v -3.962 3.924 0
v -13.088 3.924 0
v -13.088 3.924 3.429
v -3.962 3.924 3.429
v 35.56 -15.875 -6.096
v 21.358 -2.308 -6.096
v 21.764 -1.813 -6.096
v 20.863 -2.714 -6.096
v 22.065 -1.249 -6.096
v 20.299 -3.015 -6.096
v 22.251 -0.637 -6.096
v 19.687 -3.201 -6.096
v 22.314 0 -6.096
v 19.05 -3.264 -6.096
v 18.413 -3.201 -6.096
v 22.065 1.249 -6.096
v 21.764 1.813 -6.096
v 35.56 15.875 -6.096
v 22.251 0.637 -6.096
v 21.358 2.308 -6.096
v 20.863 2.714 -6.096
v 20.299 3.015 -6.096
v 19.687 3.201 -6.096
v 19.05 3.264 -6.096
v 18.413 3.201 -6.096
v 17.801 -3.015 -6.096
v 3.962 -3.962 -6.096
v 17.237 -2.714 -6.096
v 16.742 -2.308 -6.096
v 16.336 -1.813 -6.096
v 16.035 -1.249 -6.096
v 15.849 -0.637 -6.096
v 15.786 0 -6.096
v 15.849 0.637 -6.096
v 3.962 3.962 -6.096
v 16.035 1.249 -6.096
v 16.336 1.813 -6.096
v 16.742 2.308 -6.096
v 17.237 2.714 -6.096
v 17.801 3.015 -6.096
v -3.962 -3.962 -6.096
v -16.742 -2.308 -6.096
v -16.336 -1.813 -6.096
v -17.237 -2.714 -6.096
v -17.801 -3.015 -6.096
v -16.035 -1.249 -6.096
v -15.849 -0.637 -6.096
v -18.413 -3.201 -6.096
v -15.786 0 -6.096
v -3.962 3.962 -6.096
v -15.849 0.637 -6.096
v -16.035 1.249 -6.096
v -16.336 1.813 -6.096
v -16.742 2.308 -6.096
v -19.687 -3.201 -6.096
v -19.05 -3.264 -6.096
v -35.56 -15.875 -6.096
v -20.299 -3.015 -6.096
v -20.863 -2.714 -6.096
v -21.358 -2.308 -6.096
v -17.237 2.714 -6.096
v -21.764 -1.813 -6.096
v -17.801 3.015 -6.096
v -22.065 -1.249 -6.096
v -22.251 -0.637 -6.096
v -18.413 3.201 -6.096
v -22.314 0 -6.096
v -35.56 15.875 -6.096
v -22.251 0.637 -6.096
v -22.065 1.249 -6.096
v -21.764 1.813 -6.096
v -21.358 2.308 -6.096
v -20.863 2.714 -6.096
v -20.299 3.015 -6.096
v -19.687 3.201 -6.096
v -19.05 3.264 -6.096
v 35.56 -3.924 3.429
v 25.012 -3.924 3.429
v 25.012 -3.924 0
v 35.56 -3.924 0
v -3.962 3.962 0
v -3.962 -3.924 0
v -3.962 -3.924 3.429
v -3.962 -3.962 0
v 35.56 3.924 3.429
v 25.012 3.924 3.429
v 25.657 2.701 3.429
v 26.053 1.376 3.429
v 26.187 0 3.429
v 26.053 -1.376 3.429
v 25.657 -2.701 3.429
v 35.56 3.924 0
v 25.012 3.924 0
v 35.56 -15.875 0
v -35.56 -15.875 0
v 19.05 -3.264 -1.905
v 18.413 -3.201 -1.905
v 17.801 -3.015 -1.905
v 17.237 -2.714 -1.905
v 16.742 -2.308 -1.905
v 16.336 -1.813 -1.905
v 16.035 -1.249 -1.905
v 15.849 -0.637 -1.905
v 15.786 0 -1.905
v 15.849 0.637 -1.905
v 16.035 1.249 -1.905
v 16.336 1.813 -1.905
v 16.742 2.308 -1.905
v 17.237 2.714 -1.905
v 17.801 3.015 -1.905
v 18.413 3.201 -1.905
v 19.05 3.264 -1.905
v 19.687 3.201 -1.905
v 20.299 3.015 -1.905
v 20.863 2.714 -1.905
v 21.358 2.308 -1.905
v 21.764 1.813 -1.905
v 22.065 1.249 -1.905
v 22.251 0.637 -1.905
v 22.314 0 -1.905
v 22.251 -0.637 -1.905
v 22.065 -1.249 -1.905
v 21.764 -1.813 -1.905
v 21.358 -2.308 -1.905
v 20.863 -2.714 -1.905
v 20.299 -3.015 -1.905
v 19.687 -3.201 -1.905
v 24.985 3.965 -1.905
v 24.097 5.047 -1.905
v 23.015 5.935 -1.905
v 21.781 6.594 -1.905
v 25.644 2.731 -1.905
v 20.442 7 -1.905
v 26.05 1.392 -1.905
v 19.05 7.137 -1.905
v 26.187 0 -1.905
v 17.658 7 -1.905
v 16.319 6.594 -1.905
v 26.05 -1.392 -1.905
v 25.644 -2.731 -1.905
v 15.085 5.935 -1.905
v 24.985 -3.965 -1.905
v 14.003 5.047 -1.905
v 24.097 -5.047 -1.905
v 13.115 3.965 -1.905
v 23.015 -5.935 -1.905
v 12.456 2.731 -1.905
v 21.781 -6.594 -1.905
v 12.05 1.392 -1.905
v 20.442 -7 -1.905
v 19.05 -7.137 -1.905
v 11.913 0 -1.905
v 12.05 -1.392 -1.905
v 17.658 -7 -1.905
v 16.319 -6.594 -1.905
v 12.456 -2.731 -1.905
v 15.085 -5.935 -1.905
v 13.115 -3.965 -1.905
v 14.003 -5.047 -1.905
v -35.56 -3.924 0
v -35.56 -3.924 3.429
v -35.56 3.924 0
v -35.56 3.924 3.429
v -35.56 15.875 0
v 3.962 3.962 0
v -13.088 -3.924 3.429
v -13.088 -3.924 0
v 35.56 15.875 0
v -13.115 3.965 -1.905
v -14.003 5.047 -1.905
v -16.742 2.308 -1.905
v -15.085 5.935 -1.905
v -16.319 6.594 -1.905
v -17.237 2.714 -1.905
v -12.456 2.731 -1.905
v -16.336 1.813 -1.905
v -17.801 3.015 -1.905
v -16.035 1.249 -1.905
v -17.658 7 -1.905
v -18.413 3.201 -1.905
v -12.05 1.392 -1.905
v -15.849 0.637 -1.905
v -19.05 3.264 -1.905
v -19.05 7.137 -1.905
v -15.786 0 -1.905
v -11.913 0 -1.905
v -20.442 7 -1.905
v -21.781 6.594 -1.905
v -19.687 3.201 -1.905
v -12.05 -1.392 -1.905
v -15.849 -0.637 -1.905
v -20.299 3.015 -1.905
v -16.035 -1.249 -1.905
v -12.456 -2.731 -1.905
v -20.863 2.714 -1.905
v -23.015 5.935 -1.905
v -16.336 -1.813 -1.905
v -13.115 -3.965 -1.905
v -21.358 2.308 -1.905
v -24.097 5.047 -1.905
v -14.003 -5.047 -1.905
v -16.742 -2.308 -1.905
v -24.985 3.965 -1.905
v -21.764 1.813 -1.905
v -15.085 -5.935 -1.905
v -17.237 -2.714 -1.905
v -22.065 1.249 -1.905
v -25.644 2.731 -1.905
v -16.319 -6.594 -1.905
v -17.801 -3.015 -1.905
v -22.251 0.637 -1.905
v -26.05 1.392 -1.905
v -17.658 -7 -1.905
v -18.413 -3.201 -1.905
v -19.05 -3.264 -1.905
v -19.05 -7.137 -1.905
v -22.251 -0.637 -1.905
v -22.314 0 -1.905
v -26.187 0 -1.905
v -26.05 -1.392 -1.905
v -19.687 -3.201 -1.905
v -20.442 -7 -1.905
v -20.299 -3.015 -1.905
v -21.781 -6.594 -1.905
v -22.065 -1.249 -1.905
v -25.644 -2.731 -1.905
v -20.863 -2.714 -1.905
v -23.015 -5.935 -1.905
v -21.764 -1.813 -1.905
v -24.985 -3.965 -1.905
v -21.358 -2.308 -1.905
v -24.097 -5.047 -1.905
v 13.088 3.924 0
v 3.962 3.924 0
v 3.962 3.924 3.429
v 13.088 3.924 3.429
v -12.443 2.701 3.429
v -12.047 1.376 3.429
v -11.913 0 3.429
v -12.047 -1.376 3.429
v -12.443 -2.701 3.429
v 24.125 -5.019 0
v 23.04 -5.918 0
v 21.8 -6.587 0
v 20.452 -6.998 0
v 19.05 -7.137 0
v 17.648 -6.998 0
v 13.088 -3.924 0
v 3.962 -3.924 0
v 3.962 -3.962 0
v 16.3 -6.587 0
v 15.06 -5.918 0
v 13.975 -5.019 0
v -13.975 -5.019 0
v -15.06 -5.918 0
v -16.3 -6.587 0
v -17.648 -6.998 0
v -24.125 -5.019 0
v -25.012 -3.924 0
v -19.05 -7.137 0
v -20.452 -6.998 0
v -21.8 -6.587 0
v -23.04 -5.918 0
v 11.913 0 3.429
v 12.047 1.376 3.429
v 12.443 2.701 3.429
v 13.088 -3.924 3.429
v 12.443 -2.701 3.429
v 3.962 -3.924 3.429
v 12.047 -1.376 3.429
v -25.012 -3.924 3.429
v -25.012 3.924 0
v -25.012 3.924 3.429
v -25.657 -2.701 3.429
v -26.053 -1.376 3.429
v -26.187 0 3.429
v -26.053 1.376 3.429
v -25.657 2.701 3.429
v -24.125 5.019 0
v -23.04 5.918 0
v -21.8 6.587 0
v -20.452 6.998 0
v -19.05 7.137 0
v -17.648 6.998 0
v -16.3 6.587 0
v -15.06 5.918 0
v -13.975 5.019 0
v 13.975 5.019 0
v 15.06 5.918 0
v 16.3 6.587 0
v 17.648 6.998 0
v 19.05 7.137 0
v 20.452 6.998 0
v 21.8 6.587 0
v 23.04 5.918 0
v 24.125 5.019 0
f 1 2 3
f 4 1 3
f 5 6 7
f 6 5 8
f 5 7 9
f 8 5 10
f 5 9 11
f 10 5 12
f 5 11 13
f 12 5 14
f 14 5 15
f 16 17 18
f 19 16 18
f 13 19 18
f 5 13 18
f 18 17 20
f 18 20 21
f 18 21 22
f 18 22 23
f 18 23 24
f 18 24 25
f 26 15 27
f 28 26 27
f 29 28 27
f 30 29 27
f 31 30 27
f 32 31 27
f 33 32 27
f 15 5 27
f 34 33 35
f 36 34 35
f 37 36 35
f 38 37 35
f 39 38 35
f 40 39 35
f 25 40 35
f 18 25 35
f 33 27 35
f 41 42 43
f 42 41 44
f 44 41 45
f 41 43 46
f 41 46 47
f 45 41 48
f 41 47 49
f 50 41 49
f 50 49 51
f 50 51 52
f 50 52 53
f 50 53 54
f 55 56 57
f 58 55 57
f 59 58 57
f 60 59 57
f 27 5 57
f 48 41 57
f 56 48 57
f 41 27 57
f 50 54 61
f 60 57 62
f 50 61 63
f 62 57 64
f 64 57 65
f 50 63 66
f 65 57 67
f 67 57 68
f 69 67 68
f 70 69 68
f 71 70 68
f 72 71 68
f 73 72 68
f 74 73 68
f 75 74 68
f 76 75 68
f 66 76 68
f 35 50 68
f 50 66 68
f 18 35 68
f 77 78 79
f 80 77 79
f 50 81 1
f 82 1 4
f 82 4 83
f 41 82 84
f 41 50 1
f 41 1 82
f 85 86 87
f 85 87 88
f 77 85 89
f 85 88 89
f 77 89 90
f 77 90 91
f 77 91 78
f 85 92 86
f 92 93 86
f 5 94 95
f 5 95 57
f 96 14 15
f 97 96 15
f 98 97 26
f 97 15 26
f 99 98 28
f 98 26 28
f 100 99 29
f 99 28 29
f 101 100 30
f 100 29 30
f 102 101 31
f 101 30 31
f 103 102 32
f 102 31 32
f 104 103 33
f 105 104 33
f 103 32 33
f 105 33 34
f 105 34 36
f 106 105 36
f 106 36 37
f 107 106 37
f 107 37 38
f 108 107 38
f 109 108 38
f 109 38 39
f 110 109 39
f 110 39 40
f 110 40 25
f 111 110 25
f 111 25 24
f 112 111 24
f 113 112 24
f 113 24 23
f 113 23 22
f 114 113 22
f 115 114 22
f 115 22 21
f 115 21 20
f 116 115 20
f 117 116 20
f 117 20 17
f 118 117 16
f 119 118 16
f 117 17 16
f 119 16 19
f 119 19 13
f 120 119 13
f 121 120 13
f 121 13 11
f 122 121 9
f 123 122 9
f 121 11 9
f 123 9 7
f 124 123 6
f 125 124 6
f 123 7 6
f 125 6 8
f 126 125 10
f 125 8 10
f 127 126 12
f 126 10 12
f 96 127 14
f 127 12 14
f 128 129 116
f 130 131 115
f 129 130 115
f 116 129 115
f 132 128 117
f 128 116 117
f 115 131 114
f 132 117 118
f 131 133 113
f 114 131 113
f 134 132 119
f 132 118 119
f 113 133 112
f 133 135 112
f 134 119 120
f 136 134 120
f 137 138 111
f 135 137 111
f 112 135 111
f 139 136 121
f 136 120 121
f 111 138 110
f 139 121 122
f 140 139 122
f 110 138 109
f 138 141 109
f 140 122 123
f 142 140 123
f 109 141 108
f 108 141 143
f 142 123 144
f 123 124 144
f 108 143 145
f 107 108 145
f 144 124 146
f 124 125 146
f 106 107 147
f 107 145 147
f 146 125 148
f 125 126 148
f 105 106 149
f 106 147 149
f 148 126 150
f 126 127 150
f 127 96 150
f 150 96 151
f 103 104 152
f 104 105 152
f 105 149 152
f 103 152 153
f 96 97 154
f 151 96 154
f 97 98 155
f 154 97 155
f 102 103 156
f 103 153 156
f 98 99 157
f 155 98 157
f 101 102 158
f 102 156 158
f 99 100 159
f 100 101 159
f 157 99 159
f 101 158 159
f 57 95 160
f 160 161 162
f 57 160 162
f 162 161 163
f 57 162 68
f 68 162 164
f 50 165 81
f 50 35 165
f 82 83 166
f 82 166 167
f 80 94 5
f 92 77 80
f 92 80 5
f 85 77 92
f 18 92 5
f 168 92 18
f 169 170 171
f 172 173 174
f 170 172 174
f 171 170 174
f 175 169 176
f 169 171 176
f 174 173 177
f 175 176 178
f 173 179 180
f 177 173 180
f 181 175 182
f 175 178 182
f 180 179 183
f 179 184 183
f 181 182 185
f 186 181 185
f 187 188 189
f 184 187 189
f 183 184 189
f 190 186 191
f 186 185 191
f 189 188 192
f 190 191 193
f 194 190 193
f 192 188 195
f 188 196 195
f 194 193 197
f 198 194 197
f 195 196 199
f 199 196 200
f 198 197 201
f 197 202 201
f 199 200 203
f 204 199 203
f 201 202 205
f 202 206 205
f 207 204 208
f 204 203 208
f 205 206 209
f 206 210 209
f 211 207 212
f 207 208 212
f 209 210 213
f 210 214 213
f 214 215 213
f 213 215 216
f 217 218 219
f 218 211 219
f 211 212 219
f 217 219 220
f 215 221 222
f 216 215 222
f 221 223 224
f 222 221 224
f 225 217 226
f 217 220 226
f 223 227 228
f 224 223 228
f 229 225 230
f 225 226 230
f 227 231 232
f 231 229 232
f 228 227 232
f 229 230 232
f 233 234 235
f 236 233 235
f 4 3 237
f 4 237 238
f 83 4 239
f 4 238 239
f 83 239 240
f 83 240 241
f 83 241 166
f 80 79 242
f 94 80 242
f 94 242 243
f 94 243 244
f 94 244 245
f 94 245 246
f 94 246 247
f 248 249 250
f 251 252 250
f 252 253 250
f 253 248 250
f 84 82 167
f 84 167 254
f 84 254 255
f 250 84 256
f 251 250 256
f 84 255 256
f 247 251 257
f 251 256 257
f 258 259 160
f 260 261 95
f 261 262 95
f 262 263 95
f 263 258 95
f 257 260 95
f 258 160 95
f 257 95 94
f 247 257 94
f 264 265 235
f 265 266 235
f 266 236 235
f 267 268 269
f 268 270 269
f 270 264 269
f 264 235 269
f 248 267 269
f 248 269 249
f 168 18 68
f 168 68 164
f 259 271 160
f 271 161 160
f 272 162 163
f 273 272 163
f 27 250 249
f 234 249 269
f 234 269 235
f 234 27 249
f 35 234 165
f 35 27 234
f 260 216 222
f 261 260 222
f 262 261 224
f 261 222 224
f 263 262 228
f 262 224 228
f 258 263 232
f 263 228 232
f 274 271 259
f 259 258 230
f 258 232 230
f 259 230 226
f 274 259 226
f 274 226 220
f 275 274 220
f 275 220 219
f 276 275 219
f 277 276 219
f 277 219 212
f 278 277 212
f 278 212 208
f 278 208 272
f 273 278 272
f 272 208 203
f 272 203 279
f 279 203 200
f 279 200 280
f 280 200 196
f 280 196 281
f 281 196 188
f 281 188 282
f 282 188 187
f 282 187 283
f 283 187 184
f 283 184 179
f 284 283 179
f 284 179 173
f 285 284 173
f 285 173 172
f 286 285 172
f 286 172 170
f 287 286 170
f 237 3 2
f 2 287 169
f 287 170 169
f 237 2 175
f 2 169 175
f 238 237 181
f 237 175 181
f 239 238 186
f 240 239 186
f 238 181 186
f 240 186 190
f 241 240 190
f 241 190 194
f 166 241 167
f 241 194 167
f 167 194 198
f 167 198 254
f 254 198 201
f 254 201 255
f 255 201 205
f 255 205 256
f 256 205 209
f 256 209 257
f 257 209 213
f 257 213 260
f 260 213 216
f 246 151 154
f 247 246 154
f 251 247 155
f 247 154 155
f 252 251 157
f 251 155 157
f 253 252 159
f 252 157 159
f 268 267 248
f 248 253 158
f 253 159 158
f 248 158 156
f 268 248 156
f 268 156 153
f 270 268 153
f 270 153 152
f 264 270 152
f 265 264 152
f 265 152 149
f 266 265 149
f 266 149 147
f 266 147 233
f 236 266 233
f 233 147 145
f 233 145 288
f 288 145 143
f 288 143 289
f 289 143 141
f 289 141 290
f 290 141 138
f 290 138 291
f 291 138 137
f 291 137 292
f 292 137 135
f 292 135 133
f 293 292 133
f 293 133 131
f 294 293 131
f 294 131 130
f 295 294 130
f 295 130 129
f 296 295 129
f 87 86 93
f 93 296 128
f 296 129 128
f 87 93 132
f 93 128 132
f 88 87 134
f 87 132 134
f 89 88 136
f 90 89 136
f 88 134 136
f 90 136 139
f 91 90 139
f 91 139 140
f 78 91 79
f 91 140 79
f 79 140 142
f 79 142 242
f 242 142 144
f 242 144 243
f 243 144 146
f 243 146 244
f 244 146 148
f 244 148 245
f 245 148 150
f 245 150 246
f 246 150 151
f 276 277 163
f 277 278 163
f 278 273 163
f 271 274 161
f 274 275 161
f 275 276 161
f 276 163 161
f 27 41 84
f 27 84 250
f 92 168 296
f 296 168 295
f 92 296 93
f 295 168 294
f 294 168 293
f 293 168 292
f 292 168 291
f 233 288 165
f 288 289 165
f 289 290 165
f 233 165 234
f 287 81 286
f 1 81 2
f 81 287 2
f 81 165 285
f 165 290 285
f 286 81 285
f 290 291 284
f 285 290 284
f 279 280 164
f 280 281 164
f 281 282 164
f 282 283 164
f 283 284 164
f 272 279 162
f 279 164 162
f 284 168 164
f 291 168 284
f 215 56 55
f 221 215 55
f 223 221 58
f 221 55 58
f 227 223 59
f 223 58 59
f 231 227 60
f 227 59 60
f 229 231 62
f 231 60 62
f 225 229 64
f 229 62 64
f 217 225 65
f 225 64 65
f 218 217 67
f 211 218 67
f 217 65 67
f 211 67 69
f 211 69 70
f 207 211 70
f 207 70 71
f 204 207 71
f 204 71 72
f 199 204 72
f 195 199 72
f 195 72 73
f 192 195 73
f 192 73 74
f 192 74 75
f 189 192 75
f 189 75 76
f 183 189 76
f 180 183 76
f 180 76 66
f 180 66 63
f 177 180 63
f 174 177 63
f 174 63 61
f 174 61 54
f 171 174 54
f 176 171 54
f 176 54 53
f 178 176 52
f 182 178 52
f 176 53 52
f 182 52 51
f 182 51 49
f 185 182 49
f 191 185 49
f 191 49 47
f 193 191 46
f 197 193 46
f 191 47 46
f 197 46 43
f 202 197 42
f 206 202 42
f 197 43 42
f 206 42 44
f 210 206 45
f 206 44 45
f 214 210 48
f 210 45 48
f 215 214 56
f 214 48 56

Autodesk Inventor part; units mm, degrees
sketch "Sketch_1" plane through (0, 0, 0) normal (1, 0, 0) x (0, 1, 0)
  line L0 (3.9243, 3.429) -> (-3.9243, 3.429)
  line L1 (-3.9243, 3.429) -> (-3.9243, 0)
  line L2 (-3.9243, 0) -> (-15.875, 0)
  line L3 (-15.875, 0) -> (-15.875, -6.096)
  line L4 (-15.875, -6.096) -> (15.875, -6.096)
  line L5 (15.875, -6.096) -> (15.875, 0)
  line L6 (15.875, 0) -> (3.9243, 0)
  line L7 (3.9243, 0) -> (3.9243, 3.429)
extrude "Extrusion1" add sketch "Sketch_1" along normal mid plane 71.12
sketch "Sketch2" plane through (-35.56, 3.9243, 3.429) normal (0, 0, 1) x (1, 0, 0)
  point P0 (16.51, -3.9243)
hole "Drilling 1" at (-19.05, 0, 3.429) direction (0, 0, -1) diameter 6.5278 depth 9.525 counterbore diameter 14.2748 counterbore depth 5.334
sketch "Sketch3" plane through (35.56, -3.9243, 3.429) normal (0, 0, 1) x (1, 0, 0)
  point P0 (-16.51, 3.9243)
hole "Drilling 2" at (19.05, 0, 3.429) direction (0, 0, -1) diameter 6.5278 depth 9.525 counterbore diameter 14.2748 counterbore depth 5.334
sketch "Sketch_4" plane through (0, 0, 0) normal (0, 0, 1) x (1, 0, 0)
  line L0 (-3.9624, -3.9624) -> (3.9624, -3.9624)
  line L1 (3.9624, -3.9624) -> (3.9624, 3.9624)
  line L2 (3.9624, 3.9624) -> (-3.9624, 3.9624)
  line L3 (-3.9624, 3.9624) -> (-3.9624, -3.9624)
extrude "Extrusion2" cut sketch "Sketch_4" along normal mid plane 15.24
ref_plane "i1_XY" through (-19.05, 0, -1.905) normal (0, 0, 1) x (1, 0, 0)
ref_plane "i1_YZ" through (-19.05, 0, -1.905) normal (1, 0, 0) x (0, 1, 0)
ref_plane "i1_ZX" through (-19.05, 0, -1.905) normal (0, 1, 0) x (0, 0, 1)
ref_plane "i2_XY" through (19.05, 0, -1.905) normal (0, 0, 1) x (1, 0, 0)
ref_plane "i2_YZ" through (19.05, 0, -1.905) normal (1, 0, 0) x (0, 1, 0)
ref_plane "i2_ZX" through (19.05, 0, -1.905) normal (0, 1, 0) x (0, 0, 1)
ref_plane "pad_XY" through (-19.05, 0, -6.096) normal (0, 0, 1) x (1, 0, 0)
ref_plane "pad_YZ" through (-19.05, 0, -6.096) normal (1, 0, 0) x (0, 1, 0)
ref_plane "pad_ZX" through (-19.05, 0, -6.096) normal (0, 1, 0) x (0, 0, 1)
properties part number "6596_b"
